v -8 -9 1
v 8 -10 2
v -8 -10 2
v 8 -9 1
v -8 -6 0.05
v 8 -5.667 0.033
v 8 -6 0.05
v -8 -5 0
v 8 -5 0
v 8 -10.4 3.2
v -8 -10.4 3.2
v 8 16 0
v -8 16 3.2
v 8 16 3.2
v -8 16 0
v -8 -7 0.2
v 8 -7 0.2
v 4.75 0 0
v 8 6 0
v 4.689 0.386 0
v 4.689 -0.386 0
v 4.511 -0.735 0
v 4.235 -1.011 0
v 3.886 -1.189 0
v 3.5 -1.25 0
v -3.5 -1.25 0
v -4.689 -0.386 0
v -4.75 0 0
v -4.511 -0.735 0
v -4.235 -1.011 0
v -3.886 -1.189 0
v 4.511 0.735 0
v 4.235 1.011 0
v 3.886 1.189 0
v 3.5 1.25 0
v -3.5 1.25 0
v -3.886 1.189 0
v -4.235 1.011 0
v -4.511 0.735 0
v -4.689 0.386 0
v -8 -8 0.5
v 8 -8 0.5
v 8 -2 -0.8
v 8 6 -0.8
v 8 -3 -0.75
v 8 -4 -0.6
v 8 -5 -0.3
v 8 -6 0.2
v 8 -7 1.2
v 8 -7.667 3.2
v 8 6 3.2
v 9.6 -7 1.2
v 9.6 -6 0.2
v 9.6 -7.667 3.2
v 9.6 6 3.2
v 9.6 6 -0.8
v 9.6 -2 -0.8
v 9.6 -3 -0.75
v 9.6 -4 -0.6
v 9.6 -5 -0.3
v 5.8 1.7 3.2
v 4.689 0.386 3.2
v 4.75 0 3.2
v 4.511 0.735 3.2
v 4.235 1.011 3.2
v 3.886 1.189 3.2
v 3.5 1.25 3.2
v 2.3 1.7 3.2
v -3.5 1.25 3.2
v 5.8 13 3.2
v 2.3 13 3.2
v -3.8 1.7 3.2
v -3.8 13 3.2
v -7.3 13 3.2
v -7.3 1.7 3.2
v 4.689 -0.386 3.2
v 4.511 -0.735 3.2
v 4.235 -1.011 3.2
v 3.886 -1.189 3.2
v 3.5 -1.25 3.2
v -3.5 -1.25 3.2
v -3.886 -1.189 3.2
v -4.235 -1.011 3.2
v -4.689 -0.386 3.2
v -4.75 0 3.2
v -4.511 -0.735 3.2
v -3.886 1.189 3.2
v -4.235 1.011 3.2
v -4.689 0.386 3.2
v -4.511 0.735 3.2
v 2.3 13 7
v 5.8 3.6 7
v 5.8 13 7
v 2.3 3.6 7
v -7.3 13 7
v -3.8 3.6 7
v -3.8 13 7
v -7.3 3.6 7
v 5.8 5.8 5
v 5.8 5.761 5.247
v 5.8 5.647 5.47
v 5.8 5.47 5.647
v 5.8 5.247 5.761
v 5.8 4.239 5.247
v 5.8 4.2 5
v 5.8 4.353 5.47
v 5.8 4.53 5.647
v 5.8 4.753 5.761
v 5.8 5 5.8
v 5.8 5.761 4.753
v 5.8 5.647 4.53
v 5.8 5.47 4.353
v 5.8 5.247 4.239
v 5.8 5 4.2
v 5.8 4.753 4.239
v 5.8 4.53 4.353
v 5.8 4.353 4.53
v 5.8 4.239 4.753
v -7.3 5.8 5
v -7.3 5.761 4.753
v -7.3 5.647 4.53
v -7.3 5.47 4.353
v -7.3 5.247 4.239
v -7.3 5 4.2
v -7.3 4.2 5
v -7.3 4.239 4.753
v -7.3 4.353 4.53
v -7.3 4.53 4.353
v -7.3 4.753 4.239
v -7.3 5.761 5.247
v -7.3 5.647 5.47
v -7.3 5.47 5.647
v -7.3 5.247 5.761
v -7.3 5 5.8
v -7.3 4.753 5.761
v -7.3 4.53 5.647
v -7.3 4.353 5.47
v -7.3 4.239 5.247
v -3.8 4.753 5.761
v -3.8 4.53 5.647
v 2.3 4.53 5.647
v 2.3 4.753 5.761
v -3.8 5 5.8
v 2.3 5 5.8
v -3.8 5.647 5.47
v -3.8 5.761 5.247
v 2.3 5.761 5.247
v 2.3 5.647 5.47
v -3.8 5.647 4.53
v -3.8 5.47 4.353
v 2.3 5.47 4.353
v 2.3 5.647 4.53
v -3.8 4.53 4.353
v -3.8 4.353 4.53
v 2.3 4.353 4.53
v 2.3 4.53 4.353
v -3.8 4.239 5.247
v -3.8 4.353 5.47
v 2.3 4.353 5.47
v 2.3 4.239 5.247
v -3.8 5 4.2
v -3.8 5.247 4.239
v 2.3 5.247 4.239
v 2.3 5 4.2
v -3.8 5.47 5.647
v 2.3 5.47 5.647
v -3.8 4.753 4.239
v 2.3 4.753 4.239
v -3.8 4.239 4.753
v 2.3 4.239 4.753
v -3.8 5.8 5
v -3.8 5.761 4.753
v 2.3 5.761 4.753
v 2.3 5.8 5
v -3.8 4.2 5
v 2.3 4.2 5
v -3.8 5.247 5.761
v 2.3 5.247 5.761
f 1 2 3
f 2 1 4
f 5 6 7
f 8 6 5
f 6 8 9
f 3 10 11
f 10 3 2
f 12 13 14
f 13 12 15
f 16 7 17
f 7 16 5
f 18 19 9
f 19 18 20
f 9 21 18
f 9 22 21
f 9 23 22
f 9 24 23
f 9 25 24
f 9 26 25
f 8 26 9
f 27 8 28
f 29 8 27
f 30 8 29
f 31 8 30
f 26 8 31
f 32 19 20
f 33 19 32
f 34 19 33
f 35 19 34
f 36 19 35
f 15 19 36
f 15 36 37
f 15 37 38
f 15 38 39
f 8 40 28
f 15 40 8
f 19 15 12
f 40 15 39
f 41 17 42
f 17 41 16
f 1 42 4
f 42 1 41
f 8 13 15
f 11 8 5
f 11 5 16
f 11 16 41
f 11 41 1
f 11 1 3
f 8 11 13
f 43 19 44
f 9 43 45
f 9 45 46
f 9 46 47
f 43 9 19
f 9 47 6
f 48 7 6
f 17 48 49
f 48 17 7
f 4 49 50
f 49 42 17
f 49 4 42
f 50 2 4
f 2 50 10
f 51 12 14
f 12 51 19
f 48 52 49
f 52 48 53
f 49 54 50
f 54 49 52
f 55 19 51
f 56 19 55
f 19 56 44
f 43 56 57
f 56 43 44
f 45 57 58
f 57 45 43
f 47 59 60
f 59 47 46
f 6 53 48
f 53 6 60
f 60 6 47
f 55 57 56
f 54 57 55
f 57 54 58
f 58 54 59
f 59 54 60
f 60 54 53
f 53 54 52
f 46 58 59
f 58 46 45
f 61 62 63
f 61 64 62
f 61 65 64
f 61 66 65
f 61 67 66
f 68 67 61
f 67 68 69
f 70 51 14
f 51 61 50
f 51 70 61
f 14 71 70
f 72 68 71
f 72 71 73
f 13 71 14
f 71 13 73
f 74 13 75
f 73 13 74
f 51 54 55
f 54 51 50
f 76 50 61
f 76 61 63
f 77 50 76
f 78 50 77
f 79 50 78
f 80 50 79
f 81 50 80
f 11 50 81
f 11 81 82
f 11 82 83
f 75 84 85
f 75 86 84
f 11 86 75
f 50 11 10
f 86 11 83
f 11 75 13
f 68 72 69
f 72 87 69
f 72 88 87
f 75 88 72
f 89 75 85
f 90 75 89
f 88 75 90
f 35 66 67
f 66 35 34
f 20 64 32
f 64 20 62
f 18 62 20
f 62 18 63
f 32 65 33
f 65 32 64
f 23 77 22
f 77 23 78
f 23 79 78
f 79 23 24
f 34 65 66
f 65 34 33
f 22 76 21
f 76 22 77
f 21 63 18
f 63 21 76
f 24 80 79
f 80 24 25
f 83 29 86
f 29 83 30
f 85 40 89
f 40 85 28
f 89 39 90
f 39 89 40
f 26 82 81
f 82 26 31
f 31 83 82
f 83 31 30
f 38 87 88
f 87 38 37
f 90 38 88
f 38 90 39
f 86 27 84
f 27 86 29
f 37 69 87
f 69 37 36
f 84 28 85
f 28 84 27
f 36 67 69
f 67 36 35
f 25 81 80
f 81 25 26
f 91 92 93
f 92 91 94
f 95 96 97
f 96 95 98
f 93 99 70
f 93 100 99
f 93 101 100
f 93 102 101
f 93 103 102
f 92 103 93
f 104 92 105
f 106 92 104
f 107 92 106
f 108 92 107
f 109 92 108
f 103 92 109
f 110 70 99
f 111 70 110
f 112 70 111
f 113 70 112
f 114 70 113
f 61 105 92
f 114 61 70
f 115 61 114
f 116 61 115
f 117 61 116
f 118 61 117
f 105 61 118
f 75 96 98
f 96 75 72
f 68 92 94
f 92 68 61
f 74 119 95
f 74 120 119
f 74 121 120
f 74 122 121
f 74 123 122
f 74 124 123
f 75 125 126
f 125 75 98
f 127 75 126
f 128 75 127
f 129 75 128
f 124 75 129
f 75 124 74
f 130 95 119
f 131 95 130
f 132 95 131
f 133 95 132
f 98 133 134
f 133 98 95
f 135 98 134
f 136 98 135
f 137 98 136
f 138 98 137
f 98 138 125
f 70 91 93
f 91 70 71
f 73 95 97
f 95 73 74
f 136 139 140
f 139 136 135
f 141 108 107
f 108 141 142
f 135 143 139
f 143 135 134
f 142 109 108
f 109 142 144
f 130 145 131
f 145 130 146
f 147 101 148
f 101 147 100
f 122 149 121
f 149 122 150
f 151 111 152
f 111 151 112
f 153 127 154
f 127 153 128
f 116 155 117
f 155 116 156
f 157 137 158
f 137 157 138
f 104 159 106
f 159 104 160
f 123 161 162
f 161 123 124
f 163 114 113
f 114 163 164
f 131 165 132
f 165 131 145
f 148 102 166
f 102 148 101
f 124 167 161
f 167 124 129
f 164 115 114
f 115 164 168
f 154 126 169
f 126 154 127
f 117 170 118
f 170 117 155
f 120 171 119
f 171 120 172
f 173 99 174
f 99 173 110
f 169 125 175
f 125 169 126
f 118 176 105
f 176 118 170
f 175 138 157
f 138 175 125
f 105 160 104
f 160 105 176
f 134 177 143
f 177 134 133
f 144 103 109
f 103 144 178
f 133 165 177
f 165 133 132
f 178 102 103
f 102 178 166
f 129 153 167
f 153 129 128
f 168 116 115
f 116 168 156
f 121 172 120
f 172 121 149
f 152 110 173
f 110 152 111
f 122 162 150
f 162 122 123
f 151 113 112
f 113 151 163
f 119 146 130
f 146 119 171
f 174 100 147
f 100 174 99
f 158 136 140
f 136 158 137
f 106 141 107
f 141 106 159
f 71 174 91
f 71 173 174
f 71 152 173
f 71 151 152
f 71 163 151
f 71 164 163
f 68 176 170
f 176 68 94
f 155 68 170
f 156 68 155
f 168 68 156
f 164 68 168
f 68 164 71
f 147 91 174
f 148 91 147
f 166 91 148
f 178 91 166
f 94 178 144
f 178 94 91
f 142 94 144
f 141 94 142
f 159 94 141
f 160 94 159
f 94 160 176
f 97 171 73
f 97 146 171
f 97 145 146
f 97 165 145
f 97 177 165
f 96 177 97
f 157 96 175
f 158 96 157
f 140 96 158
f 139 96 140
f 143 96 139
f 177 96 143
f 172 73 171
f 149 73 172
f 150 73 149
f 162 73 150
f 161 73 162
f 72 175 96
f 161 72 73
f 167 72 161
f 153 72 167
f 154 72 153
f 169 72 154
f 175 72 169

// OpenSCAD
// file: guided_sewing_foot_template.scad
// The diameter of the MATIC rod
matic_rod_diameter = 1.6;

// The height at which the MATIC rod is placed over the plate (the least strict parameter, as the foot is amortized)
matic_rod_dz = 5.0; 

// The Y offset between the MATIC rod and the needle
matic_offset_dy = 5.0;

// The total width of the MATIC handle (including allowance)
matic_handle_width = 6.1; 

// The X offset between the needle and the center of the MATIC handle on Janome machines with a maximum stitch width of 7 mm 
janome_matic_offset_dx = -0.75;

// The width of the transport mechanism in the Janome machines
janome_transport_width = 16.0;

needle_tunnel_length_max = 7.0;
needle_tunnel_margin = 4.0;

foot_base_leftside_width = janome_transport_width / 2;
foot_base_rightside_width_full = janome_transport_width / 2;

guide_min_width = 1.6;
ear_width = 3.5;

foot_base_height = 3.2;

primary_front_length = 5.0;
primary_back_length = 16.0;

short_guide_front_length = 2.0;
short_guide_back_length = 6.0;

ears_piece_width = matic_handle_width + ear_width * 2;
right_ear_edge_x = janome_matic_offset_dx + matic_handle_width / 2 + ear_width;

module reflection(
    mirror_vector = [1, 0, 0]
) {
    union() {
        children();
        mirror(mirror_vector) {
            children();
        }
    }
}

module make_wing(
    width,
    front_length,
    back_length,
) {
    h_max = 5.0;
    dx = 1;
    
    rotate([180, -90, 0])
    linear_extrude(height=width)
    polygon(
        points=[
            [h_max, -back_length],
            [0, -back_length],
            [0.00, front_length + dx * 0],
            [0.05, front_length + dx * 1],
            [0.20, front_length + dx * 2],
            [0.50, front_length + dx * 3],
            [1.00, front_length + dx * 4],
            [2.00, front_length + dx * 5],
            [h_max, front_length + dx * 6]
        ],
        paths=[
            [0, 1, 2, 3, 4, 5, 6, 7, 8],
        ]
    );
}

module top_cutter_global() {
    a = 40;
    h = 20;
    
    translate([-a / 2, -a / 2, foot_base_height])
    cube([a, a, h]);
}

module ears_piece_base_local() {
    back_length = 8.0;
    height = 4.0;
    
    translate([-ears_piece_width/2, 0, 0])
    rotate([180, -90, 0])
    linear_extrude(height=ears_piece_width)
    polygon(
        points=[
            [height / 2, -back_length],
            [-height / 2, -back_length],
            [-height / 2, 3.4],
            [height / 2, 1.4],
        ],
        paths=[
            [0, 1, 2, 3],
        ]
    );
}

module matic_rod_cutter_local() {
    length = 40;
    
    translate([-length / 2, 0, 0])
    rotate([180, -90, 0])
    cylinder(h = length, r = matic_rod_diameter / 2, $fn = 20);
}

module matic_handle_cutter_local() {
    a = matic_handle_width;
    h = 30;
    
    translate([-a / 2, -h / 2, -h / 2])
    cube([a, h, h]);
}

module ears_piece_local() {
    difference() {
        difference() {
            ears_piece_base_local();
            matic_rod_cutter_local();
        }
        matic_handle_cutter_local();
    }
}

module ears_piece_global() {
    translate([
        janome_matic_offset_dx,
        matic_offset_dy,
        matic_rod_dz,
    ])
    ears_piece_local();
}

module make_needle_tunnel_cutter(
    length,
    width,
) {
    height = 10;

    translate([0, 0, -height / 2]) {
        translate([-length / 2, -width / 2, 0])
        cube([length, width, height]);

        reflection([1, 0, 0]) {
            translate([length / 2, 0, 0])
            cylinder(h = height, r = width / 2, $fn = 20);
        }
    }
}

module make_guided_foot(
    // The distance between the needle and the guide
    guide_offset,
    secondary_guide_offset = undef,
    guide_depth = 0.8,
    needle_tunnel_length_limit = needle_tunnel_length_max,
    use_full_width = true,
    use_full_length = false,
) {
    guide_front_length = use_full_length ? primary_front_length : short_guide_front_length;
    guide_back_length = use_full_length ? primary_back_length : short_guide_back_length;

    foot_base_rightside_width_free = use_full_width ? foot_base_rightside_width_full : right_ear_edge_x;
    foot_base_rightside_width = max(guide_offset, foot_base_rightside_width_free);

    // The nominal lenth of the needle tunnel (the maximal usable stich width)
    needle_tunnel_length_safe = (foot_base_rightside_width - needle_tunnel_margin) * 2;
    needle_tunnel_length_effective_max = min(needle_tunnel_length_limit, needle_tunnel_length_max);
    needle_tunnel_length = min(needle_tunnel_length_safe, needle_tunnel_length_effective_max);

    module make_guide(
        offset,
        base_side_width,
    ) {
        width = max(foot_base_rightside_width - offset, guide_min_width);

        translate([offset, 0, -guide_depth])
        make_wing(
            width = width,
            front_length = guide_front_length,
            back_length = guide_back_length
        );
    }

    module foot_base_global() {
        translate([-foot_base_leftside_width, 0, 0])
        make_wing(
            width = foot_base_leftside_width + foot_base_rightside_width,
            front_length = primary_front_length,
            back_length = primary_back_length
        );
    }

    module guide_global() {
        make_guide(
            offset = guide_offset,
            base_side_width = foot_base_rightside_width
        );
    }

    module secondary_guide_global() {
        if (!is_undef(secondary_guide_offset)) {
            scale([-1, 1, 1])
            make_guide(
                offset = secondary_guide_offset,
                base_side_width = foot_base_leftside_width
            );
        }
    }

    module guided_foot_global() {
        difference() {
            difference() {
                union() {
                    foot_base_global();
                    guide_global();
                    secondary_guide_global();
                }

                top_cutter_global();
            };

            needle_tunnel_cutter_global();
        }

        ears_piece_global();
    }

    module needle_tunnel_cutter_global() {
        make_needle_tunnel_cutter(
            length = needle_tunnel_length,
            width = 2.5
        );
    }

    guided_foot_global();
}
// main file
include <guided_sewing_foot_template.scad>;

make_guided_foot(
    guide_offset = 8
);
